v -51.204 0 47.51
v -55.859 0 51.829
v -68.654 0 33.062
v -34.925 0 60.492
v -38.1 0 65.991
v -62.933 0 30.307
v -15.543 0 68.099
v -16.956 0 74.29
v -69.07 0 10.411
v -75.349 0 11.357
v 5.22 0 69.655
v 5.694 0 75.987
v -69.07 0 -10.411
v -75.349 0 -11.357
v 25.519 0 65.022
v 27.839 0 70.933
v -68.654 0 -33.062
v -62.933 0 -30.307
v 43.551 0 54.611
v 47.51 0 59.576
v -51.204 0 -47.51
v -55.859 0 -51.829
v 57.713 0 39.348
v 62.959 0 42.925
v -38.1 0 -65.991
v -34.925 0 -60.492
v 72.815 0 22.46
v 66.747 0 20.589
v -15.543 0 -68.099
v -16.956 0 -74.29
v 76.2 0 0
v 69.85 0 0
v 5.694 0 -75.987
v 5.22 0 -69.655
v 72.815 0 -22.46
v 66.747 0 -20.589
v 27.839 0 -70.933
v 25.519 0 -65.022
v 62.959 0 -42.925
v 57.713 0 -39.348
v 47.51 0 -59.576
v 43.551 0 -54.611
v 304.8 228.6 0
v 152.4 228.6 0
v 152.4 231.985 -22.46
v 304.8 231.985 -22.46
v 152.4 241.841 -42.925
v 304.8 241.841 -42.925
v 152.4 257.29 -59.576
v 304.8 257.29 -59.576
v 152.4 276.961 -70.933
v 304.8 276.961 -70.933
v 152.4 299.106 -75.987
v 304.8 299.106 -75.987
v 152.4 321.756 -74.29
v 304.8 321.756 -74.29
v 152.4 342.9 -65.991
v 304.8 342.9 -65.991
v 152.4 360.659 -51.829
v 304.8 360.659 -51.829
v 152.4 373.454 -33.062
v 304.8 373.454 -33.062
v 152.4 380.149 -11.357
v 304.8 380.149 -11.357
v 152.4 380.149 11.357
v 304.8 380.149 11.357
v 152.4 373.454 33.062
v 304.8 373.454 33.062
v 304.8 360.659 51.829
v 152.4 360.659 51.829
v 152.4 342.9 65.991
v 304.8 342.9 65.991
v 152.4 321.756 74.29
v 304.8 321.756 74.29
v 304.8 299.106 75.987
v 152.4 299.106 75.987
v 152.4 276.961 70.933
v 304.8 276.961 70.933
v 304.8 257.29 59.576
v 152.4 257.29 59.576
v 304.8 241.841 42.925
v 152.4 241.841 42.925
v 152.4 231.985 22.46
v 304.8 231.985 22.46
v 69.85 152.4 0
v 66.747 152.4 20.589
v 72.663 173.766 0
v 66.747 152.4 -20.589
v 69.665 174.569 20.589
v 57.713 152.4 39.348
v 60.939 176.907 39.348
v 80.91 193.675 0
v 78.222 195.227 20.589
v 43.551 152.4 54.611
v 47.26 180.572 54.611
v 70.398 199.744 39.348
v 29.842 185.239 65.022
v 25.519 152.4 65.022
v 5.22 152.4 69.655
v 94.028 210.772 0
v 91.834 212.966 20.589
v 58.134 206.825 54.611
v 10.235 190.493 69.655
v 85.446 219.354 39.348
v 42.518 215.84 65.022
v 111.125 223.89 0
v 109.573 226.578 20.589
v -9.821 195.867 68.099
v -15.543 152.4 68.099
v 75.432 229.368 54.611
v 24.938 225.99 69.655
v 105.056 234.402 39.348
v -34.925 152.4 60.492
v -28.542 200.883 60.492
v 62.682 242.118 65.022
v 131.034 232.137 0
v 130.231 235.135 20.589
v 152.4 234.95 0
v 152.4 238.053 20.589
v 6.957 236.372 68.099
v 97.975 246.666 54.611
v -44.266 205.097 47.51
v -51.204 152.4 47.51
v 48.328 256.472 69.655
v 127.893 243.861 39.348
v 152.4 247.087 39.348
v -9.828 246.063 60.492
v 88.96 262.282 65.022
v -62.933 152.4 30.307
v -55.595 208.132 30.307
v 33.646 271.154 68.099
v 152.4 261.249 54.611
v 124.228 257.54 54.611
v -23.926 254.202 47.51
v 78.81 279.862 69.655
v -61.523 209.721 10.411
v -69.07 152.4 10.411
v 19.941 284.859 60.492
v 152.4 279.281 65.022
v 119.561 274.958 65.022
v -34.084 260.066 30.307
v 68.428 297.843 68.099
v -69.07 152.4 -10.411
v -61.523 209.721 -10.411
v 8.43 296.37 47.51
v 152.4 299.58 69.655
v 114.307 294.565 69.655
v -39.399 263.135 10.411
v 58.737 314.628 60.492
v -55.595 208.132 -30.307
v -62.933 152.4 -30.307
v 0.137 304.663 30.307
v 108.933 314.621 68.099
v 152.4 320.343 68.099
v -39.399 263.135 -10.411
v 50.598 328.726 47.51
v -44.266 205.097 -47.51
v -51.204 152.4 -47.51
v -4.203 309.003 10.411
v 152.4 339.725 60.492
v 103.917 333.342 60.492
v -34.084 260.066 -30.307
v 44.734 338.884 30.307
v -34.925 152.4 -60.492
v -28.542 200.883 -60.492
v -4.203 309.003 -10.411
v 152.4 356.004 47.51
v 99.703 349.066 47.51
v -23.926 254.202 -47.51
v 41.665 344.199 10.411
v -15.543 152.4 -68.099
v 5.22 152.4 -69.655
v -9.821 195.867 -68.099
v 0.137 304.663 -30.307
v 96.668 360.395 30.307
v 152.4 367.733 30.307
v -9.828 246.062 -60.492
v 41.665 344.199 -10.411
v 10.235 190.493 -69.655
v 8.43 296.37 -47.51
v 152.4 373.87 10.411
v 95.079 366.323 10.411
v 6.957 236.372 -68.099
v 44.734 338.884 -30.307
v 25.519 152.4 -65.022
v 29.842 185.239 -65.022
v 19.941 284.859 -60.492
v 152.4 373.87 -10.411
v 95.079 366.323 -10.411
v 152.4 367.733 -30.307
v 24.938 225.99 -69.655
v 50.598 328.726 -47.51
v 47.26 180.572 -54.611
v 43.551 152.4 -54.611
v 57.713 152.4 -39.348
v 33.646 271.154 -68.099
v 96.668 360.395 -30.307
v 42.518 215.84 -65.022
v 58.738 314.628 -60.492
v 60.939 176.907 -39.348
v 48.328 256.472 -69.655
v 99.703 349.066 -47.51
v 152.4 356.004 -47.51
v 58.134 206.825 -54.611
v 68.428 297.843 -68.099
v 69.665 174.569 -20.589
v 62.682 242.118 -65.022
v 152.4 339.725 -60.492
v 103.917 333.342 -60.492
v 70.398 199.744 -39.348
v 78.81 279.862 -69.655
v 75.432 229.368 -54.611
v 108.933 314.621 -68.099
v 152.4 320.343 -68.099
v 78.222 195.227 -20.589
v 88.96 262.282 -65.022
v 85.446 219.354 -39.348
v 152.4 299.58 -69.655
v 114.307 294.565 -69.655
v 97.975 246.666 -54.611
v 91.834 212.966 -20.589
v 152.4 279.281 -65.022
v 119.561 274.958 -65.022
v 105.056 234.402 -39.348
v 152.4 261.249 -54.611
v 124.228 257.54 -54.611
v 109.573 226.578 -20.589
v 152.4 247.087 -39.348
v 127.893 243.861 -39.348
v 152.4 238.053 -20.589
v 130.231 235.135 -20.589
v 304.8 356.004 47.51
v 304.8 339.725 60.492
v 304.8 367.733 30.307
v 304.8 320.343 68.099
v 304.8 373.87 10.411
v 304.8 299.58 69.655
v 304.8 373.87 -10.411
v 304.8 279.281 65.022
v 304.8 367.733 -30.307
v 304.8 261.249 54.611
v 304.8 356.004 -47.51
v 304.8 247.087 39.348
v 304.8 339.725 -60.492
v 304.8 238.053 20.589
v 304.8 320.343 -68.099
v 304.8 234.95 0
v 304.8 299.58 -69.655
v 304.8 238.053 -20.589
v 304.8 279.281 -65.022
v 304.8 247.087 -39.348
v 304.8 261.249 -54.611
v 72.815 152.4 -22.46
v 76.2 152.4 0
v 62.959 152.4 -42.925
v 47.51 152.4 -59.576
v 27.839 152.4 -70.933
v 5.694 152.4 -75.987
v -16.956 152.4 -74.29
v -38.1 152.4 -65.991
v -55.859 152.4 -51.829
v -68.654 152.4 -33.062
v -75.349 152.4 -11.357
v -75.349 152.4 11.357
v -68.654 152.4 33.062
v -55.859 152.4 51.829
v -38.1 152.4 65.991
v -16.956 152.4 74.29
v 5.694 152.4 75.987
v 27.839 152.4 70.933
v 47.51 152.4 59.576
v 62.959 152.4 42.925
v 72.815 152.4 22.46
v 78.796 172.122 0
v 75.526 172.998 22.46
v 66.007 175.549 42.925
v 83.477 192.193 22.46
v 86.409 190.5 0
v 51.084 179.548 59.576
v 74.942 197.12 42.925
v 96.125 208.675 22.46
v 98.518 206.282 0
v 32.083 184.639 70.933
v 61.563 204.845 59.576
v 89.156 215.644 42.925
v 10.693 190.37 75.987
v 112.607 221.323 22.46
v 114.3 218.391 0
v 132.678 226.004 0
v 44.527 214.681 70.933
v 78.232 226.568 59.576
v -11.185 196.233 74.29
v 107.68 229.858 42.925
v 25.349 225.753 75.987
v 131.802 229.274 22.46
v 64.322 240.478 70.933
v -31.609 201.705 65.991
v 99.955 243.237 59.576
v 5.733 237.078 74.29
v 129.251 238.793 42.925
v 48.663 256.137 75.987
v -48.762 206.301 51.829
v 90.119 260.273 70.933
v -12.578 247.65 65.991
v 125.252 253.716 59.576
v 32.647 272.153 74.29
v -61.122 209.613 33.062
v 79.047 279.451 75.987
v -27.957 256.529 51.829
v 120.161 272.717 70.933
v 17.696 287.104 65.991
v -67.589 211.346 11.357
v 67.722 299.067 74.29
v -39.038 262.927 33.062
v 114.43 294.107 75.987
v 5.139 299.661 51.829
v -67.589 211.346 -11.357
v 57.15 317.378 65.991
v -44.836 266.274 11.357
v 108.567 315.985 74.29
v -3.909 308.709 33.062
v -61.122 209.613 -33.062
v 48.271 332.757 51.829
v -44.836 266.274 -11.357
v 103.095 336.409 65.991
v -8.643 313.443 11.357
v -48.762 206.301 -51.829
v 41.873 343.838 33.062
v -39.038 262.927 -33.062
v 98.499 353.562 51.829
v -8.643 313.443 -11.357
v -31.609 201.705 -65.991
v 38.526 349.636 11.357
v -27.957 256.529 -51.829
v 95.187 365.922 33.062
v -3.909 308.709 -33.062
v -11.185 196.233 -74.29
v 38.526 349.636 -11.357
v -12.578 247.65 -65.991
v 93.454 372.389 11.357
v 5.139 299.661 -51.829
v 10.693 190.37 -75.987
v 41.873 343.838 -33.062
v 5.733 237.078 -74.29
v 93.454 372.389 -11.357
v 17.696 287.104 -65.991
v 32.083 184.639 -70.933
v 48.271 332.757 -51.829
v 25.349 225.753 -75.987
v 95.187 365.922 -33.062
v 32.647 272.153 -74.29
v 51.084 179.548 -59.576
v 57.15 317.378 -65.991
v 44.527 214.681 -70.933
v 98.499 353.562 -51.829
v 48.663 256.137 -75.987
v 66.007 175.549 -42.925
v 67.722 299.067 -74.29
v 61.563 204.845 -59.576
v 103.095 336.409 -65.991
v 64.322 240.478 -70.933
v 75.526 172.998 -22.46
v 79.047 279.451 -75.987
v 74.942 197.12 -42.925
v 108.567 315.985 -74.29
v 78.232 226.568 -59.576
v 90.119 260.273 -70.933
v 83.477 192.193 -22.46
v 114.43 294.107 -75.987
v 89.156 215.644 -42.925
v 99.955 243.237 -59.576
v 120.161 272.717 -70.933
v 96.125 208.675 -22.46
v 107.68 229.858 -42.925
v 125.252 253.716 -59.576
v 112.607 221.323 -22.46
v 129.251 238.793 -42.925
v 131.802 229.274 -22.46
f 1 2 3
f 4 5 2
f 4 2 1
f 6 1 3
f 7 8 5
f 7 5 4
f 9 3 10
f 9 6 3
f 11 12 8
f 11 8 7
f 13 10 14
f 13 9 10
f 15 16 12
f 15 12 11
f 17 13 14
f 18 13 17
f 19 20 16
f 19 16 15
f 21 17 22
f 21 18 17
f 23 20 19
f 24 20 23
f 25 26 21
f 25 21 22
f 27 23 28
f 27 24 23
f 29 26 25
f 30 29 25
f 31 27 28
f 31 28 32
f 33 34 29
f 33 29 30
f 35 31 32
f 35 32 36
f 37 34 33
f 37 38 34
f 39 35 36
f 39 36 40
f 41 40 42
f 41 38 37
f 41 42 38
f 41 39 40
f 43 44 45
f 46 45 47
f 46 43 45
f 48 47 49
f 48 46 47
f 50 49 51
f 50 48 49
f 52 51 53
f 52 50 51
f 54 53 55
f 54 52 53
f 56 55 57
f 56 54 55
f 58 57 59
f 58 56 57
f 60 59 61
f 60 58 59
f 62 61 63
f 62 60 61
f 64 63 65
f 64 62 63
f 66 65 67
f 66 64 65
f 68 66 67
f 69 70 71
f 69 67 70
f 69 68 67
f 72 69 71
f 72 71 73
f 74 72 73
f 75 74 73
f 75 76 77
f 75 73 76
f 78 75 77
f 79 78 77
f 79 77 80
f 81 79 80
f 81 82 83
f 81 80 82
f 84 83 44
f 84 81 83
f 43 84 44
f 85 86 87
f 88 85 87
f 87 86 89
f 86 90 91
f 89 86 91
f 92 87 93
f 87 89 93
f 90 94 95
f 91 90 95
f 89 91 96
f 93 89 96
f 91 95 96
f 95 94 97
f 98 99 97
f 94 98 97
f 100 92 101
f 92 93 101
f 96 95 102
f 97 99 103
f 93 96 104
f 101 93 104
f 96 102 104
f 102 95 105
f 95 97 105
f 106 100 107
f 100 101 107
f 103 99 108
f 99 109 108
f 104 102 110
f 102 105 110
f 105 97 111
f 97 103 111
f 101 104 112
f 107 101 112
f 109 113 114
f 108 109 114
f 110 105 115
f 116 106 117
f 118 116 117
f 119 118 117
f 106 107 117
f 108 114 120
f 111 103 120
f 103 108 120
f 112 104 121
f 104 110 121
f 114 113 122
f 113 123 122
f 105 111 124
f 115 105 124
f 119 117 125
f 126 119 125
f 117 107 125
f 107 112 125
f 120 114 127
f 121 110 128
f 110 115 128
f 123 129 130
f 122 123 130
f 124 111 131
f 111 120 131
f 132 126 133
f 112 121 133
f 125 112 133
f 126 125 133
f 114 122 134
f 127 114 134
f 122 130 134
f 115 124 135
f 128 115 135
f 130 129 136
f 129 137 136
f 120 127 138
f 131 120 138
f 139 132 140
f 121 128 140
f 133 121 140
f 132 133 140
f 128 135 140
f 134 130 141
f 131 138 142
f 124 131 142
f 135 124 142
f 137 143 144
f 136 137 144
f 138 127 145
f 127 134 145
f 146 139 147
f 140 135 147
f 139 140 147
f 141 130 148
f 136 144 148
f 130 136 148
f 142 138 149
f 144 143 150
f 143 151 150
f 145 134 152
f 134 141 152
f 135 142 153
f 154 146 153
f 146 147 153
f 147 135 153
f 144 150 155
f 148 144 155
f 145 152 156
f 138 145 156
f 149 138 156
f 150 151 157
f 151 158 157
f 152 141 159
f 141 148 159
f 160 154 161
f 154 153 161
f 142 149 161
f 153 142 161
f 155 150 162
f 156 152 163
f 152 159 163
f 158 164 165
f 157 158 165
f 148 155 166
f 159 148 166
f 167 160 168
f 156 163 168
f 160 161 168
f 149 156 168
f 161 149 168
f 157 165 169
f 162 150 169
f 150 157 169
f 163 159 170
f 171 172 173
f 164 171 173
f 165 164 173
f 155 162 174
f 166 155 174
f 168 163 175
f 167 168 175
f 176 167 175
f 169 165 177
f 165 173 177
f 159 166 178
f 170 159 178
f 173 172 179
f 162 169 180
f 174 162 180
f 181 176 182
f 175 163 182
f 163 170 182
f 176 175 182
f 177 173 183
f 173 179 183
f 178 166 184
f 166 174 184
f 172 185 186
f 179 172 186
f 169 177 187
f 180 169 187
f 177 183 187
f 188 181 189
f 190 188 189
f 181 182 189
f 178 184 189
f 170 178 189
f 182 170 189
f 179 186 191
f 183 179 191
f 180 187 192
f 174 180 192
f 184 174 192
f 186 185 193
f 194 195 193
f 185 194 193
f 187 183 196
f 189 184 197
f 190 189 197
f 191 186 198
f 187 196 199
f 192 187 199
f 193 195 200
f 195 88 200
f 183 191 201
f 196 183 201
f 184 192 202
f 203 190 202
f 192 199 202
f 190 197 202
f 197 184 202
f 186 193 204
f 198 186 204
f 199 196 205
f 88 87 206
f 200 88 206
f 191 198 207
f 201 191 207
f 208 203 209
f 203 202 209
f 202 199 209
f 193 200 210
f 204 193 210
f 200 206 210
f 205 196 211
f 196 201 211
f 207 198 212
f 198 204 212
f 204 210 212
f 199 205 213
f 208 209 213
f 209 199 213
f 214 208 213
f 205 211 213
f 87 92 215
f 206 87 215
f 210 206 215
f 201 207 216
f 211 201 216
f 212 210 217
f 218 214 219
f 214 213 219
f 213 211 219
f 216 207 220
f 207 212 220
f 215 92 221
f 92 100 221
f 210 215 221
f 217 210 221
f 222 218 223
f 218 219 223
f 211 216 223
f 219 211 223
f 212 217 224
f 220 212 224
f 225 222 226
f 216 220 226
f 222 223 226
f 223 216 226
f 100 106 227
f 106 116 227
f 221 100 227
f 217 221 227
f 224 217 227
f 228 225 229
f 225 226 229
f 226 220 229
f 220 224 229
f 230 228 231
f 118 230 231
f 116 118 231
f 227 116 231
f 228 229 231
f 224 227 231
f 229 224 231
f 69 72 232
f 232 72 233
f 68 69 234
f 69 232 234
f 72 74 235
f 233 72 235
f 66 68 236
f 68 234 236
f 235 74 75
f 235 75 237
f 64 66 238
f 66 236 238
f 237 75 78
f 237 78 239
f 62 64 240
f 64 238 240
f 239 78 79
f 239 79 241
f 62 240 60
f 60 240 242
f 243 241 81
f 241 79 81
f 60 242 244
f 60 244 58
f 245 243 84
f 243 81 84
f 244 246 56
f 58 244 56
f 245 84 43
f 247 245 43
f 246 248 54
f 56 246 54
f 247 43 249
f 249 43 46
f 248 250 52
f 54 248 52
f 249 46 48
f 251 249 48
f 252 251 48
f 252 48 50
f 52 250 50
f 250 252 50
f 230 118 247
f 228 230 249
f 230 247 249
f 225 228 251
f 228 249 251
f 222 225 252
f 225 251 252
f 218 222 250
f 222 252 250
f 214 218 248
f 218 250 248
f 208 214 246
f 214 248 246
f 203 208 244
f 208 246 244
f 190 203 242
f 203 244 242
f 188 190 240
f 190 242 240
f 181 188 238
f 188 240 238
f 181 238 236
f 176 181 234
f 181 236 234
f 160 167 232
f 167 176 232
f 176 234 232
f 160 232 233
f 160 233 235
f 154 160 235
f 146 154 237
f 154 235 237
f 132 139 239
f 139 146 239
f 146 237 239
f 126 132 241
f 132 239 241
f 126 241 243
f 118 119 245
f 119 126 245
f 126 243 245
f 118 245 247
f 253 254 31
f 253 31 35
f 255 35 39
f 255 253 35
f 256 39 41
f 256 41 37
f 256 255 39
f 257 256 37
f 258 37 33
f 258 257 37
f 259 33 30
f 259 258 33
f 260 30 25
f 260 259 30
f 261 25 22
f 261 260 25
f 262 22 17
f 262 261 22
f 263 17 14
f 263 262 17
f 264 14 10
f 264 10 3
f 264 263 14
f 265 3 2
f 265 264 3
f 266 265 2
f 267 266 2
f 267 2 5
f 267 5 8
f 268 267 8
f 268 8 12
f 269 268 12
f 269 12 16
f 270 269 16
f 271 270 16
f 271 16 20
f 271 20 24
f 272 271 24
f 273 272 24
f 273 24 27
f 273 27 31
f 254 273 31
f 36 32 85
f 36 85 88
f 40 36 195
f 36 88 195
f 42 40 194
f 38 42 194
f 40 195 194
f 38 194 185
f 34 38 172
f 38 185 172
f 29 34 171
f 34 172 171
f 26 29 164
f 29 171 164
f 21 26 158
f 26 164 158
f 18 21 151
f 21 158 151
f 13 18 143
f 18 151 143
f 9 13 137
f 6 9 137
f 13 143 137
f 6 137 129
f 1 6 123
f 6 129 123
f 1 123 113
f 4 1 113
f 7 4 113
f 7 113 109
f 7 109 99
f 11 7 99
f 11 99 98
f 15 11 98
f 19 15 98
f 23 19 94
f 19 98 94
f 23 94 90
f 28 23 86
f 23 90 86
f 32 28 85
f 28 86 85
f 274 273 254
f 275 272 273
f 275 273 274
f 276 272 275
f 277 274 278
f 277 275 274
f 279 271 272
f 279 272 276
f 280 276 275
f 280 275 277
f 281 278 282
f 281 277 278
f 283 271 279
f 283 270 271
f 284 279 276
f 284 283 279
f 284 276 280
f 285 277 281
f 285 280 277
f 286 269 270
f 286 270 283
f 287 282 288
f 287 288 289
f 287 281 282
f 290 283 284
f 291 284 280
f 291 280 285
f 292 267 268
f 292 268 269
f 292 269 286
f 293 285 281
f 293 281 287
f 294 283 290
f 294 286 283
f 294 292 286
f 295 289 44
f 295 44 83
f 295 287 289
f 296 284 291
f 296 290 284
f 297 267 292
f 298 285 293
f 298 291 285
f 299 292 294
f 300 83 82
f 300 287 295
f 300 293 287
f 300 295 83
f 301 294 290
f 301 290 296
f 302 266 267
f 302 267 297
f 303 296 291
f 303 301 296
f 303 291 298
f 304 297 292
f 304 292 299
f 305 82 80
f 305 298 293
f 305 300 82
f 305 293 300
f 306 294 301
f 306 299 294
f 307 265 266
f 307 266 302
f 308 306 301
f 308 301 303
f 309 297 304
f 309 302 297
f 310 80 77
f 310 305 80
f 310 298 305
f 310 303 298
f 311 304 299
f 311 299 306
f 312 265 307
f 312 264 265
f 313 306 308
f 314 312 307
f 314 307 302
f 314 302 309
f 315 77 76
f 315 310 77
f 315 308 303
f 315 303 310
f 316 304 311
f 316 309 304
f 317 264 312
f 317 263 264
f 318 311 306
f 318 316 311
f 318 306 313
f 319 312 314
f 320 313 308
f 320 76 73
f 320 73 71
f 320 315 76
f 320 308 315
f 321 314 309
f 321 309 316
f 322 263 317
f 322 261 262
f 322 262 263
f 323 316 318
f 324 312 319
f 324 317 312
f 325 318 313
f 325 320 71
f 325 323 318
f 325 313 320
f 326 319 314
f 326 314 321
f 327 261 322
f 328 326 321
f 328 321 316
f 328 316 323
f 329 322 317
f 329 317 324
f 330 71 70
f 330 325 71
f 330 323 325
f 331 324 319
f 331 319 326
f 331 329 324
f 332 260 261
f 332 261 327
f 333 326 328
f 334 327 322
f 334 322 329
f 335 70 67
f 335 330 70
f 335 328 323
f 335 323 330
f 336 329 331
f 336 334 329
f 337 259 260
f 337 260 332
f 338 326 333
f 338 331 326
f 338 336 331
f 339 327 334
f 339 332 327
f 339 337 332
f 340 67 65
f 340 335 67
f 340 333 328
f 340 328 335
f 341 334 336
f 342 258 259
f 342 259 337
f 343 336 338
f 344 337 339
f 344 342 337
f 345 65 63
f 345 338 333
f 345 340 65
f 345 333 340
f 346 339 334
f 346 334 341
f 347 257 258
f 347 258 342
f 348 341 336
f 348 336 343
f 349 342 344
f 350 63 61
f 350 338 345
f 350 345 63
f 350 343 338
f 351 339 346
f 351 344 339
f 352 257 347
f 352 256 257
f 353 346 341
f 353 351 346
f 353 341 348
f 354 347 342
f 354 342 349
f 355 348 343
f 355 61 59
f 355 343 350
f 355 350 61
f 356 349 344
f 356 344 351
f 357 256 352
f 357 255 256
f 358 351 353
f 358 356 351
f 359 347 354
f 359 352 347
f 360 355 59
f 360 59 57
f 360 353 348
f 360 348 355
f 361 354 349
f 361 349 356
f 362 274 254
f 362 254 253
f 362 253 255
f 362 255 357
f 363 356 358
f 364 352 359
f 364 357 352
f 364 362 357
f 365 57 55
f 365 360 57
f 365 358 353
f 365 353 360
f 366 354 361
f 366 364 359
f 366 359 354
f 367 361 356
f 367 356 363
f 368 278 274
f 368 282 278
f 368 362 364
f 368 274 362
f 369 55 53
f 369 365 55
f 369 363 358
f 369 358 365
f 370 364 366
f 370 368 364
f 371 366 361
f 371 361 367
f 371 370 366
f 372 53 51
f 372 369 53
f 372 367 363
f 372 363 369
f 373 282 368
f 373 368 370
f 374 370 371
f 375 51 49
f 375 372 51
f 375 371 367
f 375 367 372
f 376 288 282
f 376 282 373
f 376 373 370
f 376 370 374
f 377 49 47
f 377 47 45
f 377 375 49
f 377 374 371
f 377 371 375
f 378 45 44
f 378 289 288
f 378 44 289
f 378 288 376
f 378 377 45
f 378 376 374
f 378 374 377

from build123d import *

# Parameters (mm, degrees)
F0_R = 76.2
F3_T = -6.35


with BuildPart() as f2:
    # F2: sweep along a path in F1
    with BuildLine(Plane.XY) as f2_path:
        Line((0, 0), (0, 152.4))
        ThreePointArc((0, 152.4), (44.6369265472, 260.1630734528), (152.4, 304.8))
        Line((152.4, 304.8), (304.8, 304.8))
    # F0 (on Front) → F2 (sweep)
    with BuildSketch(Plane.XZ):
        Circle(F0_R)
    sweep(path=f2_path.line)

    # F3
    f3_openings = [f2.faces().sort_by_distance(p)[0] for p in [
        (0, 0, 0),
        (304.8, 304.8, 0),
    ]]
    offset(amount=F3_T, openings=f3_openings)


solid = f2.part
